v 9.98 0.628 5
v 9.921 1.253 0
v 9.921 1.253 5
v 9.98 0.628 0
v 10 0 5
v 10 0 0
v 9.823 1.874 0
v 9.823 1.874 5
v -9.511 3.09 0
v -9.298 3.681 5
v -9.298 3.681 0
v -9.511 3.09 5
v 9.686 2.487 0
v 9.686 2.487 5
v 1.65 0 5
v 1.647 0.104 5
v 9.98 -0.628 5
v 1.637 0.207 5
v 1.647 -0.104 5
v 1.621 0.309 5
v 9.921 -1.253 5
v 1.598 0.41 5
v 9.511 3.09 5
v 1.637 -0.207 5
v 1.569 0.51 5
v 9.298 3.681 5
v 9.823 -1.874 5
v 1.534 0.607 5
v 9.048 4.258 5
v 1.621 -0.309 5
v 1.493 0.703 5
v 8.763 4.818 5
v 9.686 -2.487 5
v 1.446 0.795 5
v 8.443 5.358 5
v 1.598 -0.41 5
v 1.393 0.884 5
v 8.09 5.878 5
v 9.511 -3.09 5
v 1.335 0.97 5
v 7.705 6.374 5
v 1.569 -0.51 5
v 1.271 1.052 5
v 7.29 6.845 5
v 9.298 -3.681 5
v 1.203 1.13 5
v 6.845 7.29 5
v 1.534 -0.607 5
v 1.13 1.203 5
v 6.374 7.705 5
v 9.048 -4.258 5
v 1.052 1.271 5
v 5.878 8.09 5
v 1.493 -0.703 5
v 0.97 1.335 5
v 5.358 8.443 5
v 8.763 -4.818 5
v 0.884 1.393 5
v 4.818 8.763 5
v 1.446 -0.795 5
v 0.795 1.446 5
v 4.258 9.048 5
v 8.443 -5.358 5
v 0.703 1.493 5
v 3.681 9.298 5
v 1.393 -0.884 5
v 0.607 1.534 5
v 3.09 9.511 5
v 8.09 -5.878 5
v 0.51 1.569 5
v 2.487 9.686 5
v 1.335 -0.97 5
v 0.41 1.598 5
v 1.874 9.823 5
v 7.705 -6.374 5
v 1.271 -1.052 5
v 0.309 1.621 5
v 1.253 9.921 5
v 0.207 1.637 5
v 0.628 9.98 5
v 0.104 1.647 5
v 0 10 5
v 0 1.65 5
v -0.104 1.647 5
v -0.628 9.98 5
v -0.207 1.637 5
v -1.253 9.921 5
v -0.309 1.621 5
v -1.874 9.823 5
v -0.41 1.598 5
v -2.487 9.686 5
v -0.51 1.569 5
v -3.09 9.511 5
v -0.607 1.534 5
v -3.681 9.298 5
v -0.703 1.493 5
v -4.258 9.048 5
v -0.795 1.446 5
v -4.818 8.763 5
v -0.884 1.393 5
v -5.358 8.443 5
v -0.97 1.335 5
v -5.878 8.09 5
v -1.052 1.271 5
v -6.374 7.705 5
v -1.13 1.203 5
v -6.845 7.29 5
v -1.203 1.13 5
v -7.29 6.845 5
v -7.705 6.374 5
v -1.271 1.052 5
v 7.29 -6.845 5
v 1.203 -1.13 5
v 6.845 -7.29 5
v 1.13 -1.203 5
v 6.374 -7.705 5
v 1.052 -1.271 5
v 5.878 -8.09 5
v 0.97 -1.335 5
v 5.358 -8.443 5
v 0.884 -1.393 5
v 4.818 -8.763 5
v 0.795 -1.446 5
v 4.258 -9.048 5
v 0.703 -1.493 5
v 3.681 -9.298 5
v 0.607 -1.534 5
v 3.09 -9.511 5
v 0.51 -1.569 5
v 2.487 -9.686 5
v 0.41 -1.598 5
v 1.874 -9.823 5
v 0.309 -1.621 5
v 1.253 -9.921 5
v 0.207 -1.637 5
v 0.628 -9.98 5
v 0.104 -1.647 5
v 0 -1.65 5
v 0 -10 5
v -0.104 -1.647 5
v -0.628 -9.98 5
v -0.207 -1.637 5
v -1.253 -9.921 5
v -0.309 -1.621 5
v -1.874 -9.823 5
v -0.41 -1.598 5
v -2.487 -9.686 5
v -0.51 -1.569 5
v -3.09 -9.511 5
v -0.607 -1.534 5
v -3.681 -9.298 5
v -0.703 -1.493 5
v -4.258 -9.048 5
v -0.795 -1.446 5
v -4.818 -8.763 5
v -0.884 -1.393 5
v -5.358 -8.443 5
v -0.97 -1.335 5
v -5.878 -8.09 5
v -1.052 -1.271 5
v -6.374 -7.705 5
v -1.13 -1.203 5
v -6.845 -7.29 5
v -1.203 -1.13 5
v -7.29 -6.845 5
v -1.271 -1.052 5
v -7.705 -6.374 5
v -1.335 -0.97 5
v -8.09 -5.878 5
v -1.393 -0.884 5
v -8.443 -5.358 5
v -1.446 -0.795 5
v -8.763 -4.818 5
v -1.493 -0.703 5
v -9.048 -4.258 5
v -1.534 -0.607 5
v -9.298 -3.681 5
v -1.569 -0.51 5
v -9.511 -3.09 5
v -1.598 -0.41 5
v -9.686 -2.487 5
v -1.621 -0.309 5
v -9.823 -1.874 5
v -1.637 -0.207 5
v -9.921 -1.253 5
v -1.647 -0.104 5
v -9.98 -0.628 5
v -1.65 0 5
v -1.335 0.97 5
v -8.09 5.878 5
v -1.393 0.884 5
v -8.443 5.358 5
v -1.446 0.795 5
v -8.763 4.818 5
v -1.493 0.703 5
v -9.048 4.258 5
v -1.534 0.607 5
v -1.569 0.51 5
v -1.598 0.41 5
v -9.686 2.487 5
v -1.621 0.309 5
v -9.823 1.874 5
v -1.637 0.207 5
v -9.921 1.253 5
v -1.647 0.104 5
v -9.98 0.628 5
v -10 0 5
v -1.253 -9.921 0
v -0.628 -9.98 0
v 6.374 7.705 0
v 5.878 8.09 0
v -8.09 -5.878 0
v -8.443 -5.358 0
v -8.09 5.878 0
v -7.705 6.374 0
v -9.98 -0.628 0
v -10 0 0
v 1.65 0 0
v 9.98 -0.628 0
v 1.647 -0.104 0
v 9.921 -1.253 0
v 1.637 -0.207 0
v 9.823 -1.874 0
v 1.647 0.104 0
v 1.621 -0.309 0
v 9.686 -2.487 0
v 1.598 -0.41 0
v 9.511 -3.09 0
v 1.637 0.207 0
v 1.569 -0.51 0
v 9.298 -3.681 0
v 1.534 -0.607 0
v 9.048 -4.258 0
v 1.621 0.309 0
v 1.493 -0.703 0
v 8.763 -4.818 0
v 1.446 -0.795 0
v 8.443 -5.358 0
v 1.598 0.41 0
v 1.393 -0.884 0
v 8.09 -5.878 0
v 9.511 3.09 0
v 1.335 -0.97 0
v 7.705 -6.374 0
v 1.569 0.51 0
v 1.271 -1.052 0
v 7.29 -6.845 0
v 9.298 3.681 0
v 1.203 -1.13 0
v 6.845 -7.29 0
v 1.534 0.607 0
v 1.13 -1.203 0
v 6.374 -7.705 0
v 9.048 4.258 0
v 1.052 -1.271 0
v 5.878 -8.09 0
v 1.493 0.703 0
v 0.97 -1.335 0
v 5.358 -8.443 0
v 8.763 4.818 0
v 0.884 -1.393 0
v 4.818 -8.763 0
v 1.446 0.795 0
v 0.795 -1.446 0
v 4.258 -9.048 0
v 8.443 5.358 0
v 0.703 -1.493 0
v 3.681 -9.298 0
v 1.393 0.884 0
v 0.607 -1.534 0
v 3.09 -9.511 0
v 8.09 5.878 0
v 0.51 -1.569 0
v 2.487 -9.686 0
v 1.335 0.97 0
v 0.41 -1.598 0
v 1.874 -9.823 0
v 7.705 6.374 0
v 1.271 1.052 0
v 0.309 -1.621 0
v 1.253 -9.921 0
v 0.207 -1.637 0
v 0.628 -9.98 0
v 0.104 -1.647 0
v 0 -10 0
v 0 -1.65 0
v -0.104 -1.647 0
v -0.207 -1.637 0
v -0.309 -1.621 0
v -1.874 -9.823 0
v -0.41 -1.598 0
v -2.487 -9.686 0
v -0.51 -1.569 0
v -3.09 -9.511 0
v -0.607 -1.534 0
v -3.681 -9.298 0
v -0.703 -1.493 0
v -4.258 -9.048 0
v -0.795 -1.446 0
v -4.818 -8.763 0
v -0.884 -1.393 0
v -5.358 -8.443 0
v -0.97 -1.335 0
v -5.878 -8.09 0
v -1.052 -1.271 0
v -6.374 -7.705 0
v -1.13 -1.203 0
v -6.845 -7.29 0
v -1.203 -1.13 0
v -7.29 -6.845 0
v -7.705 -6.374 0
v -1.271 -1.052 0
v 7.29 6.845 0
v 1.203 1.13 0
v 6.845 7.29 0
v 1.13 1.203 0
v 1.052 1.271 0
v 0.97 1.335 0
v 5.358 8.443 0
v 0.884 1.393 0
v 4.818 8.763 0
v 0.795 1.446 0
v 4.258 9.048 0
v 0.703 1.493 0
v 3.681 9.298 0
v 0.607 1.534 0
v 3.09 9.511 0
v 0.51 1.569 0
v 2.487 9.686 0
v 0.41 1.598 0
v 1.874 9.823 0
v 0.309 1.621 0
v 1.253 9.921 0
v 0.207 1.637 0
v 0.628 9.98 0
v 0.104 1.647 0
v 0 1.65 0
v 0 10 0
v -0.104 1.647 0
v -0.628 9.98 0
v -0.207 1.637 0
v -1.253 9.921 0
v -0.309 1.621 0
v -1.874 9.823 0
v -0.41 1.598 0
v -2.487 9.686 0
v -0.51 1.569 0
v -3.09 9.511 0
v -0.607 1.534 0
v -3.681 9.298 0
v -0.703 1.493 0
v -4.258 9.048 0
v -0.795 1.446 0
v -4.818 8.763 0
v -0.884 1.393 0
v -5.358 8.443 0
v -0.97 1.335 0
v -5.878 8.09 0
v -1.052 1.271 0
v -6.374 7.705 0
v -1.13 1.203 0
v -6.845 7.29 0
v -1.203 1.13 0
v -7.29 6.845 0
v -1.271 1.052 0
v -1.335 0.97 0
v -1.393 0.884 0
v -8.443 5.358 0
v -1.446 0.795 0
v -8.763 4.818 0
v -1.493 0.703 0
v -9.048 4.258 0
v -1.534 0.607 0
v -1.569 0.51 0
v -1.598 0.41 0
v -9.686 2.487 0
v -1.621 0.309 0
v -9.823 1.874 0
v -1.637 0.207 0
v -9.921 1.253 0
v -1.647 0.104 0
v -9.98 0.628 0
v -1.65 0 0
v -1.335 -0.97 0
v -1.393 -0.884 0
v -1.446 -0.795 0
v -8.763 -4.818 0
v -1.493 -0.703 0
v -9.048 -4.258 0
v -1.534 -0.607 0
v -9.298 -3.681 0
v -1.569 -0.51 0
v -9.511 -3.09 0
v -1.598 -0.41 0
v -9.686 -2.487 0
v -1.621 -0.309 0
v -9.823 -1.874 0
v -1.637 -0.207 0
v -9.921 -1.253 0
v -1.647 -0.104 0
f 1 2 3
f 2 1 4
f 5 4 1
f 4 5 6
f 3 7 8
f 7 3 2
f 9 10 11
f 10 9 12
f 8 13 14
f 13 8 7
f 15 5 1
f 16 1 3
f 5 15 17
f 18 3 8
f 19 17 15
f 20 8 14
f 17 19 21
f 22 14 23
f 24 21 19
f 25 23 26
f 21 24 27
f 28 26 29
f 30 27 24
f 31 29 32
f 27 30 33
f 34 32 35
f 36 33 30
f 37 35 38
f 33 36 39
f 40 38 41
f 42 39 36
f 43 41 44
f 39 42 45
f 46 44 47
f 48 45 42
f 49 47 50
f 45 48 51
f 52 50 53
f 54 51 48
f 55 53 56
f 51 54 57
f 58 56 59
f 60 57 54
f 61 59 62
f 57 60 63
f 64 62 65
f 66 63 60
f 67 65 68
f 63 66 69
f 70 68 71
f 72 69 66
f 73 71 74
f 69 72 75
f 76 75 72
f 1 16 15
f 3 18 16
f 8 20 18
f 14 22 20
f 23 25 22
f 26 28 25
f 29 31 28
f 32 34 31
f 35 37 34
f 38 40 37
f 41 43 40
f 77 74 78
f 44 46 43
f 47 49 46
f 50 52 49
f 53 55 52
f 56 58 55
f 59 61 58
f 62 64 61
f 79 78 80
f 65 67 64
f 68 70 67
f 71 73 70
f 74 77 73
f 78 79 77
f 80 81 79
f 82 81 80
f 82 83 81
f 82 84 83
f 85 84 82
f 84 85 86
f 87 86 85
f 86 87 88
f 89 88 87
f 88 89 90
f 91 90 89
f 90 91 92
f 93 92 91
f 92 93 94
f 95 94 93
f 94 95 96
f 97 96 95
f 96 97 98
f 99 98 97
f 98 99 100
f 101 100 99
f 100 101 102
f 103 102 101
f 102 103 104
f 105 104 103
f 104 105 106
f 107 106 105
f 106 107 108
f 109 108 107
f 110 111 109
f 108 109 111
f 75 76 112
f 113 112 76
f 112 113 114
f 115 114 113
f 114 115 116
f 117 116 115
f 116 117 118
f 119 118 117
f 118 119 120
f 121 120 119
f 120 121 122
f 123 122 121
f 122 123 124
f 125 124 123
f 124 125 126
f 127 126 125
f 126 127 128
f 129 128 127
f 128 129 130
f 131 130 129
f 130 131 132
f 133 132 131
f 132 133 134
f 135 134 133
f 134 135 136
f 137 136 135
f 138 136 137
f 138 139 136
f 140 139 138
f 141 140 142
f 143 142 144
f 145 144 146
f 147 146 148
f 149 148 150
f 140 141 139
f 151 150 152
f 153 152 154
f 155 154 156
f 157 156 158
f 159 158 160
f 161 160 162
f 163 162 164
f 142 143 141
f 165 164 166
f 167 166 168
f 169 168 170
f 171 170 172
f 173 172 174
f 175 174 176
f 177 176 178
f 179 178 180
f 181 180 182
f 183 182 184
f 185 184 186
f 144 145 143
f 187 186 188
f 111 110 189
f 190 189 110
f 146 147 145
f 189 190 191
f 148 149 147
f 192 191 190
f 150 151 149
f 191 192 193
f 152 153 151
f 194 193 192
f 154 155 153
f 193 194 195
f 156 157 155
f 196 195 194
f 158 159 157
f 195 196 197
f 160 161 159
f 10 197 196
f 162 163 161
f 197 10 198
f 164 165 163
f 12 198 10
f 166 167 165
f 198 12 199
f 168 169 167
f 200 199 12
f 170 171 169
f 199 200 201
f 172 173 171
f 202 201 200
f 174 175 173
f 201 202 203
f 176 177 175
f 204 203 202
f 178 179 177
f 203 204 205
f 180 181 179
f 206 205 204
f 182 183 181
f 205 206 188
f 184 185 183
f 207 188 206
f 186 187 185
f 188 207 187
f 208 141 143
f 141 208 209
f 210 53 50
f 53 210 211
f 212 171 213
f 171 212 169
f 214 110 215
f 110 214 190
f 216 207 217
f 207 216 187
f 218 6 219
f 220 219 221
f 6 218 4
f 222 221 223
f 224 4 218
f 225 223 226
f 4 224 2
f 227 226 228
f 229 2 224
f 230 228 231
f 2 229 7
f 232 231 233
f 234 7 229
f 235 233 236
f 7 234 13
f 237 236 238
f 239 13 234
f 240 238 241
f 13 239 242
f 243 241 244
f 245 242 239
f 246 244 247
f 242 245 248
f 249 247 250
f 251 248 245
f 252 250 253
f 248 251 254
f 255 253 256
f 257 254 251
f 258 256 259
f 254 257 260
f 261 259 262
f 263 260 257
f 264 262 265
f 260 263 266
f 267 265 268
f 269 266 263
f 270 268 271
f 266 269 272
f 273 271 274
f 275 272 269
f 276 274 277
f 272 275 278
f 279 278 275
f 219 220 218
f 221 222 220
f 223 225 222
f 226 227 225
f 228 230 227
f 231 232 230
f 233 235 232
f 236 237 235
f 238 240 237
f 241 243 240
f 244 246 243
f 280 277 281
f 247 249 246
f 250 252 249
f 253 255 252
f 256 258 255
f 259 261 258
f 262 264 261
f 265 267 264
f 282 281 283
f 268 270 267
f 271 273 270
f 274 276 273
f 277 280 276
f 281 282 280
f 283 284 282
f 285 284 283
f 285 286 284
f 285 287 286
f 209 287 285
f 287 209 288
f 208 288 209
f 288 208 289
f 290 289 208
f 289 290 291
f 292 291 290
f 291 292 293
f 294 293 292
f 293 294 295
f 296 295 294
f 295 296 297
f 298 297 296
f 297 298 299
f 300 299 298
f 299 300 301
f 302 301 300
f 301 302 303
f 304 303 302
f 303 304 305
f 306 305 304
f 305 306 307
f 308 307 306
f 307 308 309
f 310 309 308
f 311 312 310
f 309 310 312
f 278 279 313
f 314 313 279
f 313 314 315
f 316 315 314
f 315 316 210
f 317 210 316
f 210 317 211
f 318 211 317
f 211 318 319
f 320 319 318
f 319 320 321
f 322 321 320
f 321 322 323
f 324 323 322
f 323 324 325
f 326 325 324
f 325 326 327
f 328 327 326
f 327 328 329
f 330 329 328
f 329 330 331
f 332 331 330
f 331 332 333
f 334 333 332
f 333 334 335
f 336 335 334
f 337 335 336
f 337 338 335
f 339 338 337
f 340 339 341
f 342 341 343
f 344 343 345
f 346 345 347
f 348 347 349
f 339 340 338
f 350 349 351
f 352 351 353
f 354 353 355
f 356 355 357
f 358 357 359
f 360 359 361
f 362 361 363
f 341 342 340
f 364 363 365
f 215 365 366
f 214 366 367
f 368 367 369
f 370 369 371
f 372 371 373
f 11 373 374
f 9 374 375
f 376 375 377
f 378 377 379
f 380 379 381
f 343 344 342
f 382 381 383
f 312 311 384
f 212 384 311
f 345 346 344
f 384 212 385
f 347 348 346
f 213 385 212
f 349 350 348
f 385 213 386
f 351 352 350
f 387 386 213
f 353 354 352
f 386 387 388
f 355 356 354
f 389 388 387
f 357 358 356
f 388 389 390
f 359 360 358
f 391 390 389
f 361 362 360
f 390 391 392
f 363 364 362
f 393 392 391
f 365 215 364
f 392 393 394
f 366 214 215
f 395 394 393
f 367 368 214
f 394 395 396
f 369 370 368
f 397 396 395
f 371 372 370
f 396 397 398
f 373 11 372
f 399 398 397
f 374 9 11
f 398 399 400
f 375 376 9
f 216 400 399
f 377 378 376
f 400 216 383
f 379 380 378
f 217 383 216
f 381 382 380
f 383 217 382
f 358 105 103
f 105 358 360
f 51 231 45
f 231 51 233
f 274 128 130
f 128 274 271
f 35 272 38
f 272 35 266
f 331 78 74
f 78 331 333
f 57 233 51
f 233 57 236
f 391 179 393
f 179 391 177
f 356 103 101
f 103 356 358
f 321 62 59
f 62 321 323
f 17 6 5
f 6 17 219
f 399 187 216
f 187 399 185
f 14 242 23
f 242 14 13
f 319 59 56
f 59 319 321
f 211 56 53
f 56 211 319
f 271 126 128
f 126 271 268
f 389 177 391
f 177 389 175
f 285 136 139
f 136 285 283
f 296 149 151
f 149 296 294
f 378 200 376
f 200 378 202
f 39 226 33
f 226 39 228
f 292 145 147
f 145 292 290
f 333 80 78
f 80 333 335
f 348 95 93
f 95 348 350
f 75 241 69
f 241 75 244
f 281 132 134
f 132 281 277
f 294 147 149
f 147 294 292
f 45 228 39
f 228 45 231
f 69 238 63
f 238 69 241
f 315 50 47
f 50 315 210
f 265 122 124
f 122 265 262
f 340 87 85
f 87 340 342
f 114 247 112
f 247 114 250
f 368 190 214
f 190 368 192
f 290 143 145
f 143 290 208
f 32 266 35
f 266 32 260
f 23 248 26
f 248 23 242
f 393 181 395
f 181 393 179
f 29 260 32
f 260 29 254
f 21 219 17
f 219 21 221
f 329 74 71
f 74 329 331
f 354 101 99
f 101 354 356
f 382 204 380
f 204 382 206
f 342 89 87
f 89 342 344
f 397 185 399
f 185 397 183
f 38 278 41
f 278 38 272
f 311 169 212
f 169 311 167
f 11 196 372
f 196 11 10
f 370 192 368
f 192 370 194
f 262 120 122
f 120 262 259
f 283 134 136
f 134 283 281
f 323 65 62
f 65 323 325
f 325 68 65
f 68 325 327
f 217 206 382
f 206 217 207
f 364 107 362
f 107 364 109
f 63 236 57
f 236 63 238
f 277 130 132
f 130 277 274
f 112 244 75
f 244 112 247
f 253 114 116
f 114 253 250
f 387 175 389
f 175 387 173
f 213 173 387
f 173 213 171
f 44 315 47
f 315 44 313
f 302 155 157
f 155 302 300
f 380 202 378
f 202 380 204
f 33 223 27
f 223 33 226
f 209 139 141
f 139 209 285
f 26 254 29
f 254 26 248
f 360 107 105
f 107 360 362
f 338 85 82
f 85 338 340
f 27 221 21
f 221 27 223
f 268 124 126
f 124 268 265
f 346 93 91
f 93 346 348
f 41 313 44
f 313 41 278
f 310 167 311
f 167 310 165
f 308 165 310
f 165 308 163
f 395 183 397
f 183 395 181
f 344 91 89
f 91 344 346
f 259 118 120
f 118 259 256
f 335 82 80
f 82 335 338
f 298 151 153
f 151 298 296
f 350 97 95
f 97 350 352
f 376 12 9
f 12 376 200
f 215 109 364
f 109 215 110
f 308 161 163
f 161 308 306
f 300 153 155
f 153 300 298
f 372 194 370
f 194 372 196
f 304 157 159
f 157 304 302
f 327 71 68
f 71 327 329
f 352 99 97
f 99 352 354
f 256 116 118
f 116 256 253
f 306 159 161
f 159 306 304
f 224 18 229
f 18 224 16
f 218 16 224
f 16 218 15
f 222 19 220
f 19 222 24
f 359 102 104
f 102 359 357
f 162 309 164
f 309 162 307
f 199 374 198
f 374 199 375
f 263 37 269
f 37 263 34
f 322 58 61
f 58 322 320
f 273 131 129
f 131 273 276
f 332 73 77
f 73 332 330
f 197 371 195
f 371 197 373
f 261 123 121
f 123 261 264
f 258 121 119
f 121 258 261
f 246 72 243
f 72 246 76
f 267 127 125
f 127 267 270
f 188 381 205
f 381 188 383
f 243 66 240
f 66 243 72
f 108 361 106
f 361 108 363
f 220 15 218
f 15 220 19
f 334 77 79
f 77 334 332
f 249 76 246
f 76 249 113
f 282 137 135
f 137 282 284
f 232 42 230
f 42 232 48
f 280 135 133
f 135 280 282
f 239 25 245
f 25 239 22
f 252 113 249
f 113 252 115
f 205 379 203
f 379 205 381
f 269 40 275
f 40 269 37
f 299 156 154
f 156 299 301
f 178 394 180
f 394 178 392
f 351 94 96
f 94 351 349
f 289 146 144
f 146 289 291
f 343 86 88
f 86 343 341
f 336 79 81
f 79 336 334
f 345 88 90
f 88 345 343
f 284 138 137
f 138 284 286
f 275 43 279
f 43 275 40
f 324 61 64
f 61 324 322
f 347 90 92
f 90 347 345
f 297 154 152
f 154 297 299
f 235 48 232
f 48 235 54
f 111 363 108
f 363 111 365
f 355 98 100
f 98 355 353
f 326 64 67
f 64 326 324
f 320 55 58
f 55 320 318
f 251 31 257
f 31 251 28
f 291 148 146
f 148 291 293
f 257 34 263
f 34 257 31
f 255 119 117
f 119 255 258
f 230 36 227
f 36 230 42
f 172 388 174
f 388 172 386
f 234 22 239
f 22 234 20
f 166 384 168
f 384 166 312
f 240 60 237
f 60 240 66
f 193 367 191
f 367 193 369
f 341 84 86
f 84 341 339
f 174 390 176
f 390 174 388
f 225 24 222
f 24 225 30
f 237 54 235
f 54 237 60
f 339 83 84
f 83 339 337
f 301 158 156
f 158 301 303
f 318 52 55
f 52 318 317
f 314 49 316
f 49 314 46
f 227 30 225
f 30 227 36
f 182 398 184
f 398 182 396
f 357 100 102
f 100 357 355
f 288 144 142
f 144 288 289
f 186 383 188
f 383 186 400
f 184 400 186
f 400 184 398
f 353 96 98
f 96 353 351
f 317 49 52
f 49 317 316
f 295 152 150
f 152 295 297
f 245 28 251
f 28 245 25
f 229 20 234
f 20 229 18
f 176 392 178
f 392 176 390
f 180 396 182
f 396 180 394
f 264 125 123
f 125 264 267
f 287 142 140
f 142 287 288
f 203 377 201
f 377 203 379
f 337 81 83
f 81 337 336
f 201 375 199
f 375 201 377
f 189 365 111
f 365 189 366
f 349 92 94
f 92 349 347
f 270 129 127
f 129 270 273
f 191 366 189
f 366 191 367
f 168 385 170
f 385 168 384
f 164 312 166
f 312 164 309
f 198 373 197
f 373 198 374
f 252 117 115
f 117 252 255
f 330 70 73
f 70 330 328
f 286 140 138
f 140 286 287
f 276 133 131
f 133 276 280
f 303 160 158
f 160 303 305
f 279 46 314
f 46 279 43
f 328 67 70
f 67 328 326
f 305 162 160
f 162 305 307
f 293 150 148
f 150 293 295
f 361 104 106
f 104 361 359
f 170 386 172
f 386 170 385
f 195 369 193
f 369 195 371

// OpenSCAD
$fn = 100;
module wheel(h) {
    difference() {
        cylinder(r=10, h=h);
        cylinder(r=3.3/2, h=h);
    }
}

wheel(5);
